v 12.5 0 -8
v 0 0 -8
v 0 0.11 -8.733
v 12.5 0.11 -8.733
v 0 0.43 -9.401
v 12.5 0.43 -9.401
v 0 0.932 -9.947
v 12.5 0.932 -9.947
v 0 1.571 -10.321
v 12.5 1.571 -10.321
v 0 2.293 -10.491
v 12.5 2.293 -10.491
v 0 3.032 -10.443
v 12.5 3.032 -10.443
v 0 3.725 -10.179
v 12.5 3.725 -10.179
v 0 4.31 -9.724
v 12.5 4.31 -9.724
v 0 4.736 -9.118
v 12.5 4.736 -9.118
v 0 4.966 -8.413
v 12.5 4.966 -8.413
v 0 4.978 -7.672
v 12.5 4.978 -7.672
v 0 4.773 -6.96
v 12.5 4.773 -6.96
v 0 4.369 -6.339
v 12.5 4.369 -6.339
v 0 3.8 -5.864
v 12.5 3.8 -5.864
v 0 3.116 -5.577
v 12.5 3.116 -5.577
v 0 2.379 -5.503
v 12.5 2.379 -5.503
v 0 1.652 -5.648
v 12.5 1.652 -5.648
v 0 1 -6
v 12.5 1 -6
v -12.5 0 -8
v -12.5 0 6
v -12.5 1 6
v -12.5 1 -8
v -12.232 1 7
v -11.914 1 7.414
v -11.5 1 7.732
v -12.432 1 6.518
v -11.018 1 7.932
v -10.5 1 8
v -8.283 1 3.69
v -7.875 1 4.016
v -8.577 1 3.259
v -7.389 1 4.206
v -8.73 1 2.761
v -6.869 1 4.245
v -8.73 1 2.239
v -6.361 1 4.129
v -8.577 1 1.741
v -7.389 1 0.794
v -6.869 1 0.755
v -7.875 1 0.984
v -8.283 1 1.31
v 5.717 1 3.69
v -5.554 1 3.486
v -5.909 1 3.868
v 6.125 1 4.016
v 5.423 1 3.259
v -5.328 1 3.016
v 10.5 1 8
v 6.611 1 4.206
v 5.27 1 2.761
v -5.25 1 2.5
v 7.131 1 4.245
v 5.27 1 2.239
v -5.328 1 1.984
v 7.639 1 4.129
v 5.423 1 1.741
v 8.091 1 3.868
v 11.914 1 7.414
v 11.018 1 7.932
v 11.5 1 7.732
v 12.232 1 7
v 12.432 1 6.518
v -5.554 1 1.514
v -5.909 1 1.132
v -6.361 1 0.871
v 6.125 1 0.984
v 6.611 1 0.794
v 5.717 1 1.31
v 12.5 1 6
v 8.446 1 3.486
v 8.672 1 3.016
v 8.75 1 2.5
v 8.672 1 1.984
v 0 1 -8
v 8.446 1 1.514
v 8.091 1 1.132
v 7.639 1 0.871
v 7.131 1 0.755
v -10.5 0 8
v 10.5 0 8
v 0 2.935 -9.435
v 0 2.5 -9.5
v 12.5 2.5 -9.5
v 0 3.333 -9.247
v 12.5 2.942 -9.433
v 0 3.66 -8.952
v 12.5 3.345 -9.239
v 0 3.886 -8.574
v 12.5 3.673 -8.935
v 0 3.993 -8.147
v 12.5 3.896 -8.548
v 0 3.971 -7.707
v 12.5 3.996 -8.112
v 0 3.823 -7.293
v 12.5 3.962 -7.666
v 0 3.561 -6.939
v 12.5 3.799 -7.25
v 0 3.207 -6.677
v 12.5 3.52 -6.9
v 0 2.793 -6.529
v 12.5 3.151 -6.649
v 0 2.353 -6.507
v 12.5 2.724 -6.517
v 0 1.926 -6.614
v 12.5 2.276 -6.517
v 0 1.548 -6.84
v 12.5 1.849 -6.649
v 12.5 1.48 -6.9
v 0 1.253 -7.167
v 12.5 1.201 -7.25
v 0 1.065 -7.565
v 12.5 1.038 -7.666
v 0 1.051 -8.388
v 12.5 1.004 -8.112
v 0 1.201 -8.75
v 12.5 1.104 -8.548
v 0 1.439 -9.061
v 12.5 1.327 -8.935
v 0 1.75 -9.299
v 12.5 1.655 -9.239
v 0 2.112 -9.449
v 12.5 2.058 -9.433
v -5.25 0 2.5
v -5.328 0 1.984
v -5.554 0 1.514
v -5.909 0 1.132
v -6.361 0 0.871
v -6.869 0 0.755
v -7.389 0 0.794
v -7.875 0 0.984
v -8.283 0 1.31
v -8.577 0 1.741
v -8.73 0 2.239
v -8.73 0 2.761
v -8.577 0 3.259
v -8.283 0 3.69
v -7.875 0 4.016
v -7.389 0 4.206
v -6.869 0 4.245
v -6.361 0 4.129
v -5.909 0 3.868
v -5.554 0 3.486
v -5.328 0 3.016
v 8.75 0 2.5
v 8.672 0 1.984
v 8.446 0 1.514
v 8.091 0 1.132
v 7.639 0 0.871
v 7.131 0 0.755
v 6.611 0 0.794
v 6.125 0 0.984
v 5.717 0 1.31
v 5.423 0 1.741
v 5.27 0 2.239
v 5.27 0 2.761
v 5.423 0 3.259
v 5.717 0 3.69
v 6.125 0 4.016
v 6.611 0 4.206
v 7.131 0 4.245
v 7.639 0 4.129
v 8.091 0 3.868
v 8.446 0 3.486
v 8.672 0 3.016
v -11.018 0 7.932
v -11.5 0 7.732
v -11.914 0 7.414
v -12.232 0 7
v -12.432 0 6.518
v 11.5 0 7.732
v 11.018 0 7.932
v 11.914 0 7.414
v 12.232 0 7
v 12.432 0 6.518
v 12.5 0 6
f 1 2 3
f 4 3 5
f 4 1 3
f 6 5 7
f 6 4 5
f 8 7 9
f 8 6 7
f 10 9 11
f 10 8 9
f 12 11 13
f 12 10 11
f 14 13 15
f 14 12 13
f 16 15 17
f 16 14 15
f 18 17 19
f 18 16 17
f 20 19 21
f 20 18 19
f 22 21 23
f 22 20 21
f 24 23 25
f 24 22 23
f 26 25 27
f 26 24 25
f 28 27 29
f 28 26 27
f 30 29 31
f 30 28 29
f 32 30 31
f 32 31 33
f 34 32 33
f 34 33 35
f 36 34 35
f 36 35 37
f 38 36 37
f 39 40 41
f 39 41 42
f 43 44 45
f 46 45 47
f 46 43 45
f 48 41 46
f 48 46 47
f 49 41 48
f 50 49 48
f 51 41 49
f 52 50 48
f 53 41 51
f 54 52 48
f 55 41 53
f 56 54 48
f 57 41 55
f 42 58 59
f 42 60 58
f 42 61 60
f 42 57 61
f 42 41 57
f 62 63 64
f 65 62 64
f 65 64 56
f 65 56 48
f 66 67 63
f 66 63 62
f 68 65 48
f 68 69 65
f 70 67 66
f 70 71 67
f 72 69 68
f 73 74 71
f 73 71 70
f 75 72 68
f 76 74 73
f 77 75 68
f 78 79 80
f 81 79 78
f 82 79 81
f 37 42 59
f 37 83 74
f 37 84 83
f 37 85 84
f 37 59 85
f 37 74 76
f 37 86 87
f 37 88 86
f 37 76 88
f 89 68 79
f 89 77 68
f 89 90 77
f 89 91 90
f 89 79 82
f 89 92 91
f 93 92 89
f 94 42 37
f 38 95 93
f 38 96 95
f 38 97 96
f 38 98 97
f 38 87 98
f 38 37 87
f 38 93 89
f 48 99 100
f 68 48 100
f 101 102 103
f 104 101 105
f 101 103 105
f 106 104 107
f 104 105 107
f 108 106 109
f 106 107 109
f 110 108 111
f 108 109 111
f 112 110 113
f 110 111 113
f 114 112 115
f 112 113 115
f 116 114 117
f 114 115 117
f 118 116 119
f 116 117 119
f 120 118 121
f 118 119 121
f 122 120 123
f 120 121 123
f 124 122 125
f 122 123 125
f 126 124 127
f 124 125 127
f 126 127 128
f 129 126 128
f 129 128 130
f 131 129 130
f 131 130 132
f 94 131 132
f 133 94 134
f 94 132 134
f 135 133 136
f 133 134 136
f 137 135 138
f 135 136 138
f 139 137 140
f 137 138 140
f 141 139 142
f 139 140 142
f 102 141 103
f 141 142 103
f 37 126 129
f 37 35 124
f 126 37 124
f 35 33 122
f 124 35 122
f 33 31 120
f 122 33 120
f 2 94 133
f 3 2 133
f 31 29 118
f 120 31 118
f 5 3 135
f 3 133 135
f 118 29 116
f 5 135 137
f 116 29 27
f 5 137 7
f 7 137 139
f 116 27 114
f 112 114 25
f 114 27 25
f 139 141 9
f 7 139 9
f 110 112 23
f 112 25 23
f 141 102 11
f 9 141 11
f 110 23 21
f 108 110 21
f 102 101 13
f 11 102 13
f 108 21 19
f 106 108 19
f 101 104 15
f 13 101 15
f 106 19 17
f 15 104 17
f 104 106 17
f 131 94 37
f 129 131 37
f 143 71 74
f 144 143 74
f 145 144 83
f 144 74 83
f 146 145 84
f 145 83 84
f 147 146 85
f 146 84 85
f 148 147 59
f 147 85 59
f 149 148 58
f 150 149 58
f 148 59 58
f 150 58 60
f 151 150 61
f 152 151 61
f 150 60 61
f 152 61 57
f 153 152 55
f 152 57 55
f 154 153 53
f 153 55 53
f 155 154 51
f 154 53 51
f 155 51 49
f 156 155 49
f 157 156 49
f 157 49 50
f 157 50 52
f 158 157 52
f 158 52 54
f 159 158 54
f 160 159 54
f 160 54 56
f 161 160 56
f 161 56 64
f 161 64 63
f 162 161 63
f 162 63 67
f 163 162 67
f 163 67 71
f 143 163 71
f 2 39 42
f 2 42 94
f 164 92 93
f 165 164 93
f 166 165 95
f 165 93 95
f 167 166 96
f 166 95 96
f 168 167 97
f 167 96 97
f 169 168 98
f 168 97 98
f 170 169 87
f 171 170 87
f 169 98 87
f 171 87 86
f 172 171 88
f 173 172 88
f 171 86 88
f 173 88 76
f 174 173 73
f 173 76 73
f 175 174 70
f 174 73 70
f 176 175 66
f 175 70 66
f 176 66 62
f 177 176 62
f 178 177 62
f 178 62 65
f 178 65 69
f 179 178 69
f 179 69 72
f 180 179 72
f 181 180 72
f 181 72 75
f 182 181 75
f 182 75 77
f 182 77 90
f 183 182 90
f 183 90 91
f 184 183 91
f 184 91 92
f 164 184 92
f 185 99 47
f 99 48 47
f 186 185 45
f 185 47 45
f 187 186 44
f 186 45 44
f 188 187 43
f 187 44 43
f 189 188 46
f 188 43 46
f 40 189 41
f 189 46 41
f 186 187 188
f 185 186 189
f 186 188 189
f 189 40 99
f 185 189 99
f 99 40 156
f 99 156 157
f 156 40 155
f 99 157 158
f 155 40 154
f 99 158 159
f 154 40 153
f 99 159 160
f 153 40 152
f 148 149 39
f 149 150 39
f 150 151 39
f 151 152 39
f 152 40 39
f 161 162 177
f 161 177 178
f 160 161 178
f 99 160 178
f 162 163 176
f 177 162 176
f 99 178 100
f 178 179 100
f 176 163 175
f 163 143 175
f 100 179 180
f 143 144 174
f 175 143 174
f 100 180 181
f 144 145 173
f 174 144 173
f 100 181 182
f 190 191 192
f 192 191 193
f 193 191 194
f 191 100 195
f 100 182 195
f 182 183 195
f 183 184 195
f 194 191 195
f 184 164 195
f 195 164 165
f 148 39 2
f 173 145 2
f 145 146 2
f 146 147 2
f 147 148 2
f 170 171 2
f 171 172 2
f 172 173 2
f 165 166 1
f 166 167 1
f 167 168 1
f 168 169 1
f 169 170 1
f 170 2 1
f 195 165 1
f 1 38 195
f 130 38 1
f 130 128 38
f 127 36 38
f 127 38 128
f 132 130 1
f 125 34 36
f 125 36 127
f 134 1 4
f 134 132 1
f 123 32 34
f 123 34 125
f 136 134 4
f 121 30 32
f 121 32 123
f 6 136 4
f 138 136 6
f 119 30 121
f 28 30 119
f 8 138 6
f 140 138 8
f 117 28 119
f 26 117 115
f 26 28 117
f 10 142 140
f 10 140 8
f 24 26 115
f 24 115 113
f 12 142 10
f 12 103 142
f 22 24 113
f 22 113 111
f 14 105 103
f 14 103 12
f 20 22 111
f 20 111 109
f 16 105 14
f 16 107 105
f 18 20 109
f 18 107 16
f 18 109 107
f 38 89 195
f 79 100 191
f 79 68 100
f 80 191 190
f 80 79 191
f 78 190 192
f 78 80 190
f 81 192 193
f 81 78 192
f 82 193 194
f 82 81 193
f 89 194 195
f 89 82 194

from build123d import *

# Parameters (mm, degrees)
SKETCH_1_W          = 25
SKETCH_1_H          = 16
EXTRUDE_1_DEPTH     = 1
SKETCH_2_R          = 1.75
CUT_EXTRUDE_1_DEPTH = 2
SKETCH_3_R          = 2.5
SKETCH_3_R_2        = 1.5
EXTRUDE_2_DEPTH     = 12.5
FILLET_1_R          = 2


with BuildPart() as part:
    # 草图1 → 凸台-拉伸1 (new body)
    with BuildSketch(Plane(origin=(0, 0, 0), x_dir=(1, 0, 0), z_dir=(0, 1, 0))):
        Rectangle(SKETCH_1_W, SKETCH_1_H)
    extrude(amount=EXTRUDE_1_DEPTH)

    # 草图2 → 切除-拉伸1 (cut, through all)
    with BuildSketch(Plane(origin=(0, 1, 0), x_dir=(1, 0, 0), z_dir=(0, 1, 0))):
        with Locations((-7, -2.5)):
            Circle(SKETCH_2_R)
        with Locations((7, -2.5)):
            Circle(SKETCH_2_R)
    extrude(amount=-CUT_EXTRUDE_1_DEPTH, mode=Mode.SUBTRACT)

    # 草图3 → 凸台-拉伸2 (add)
    with BuildSketch(Plane(origin=(12.5, 0, 0), x_dir=(0, 0, -1), z_dir=(1, 0, 0))):
        with Locations((8, 2.5)):
            Circle(SKETCH_3_R)
        with Locations((8, 2.5)):
            Circle(SKETCH_3_R_2, mode=Mode.SUBTRACT)
    extrude(amount=-EXTRUDE_2_DEPTH)

    # 圆角1
    fillet_1_edges = [part.edges().sort_by_distance(p)[0] for p in [
        (12.5, 0.5, 8),
        (-12.5, 0.5, 8),
    ]]
    fillet(fillet_1_edges, radius=FILLET_1_R)


solid = part.part
